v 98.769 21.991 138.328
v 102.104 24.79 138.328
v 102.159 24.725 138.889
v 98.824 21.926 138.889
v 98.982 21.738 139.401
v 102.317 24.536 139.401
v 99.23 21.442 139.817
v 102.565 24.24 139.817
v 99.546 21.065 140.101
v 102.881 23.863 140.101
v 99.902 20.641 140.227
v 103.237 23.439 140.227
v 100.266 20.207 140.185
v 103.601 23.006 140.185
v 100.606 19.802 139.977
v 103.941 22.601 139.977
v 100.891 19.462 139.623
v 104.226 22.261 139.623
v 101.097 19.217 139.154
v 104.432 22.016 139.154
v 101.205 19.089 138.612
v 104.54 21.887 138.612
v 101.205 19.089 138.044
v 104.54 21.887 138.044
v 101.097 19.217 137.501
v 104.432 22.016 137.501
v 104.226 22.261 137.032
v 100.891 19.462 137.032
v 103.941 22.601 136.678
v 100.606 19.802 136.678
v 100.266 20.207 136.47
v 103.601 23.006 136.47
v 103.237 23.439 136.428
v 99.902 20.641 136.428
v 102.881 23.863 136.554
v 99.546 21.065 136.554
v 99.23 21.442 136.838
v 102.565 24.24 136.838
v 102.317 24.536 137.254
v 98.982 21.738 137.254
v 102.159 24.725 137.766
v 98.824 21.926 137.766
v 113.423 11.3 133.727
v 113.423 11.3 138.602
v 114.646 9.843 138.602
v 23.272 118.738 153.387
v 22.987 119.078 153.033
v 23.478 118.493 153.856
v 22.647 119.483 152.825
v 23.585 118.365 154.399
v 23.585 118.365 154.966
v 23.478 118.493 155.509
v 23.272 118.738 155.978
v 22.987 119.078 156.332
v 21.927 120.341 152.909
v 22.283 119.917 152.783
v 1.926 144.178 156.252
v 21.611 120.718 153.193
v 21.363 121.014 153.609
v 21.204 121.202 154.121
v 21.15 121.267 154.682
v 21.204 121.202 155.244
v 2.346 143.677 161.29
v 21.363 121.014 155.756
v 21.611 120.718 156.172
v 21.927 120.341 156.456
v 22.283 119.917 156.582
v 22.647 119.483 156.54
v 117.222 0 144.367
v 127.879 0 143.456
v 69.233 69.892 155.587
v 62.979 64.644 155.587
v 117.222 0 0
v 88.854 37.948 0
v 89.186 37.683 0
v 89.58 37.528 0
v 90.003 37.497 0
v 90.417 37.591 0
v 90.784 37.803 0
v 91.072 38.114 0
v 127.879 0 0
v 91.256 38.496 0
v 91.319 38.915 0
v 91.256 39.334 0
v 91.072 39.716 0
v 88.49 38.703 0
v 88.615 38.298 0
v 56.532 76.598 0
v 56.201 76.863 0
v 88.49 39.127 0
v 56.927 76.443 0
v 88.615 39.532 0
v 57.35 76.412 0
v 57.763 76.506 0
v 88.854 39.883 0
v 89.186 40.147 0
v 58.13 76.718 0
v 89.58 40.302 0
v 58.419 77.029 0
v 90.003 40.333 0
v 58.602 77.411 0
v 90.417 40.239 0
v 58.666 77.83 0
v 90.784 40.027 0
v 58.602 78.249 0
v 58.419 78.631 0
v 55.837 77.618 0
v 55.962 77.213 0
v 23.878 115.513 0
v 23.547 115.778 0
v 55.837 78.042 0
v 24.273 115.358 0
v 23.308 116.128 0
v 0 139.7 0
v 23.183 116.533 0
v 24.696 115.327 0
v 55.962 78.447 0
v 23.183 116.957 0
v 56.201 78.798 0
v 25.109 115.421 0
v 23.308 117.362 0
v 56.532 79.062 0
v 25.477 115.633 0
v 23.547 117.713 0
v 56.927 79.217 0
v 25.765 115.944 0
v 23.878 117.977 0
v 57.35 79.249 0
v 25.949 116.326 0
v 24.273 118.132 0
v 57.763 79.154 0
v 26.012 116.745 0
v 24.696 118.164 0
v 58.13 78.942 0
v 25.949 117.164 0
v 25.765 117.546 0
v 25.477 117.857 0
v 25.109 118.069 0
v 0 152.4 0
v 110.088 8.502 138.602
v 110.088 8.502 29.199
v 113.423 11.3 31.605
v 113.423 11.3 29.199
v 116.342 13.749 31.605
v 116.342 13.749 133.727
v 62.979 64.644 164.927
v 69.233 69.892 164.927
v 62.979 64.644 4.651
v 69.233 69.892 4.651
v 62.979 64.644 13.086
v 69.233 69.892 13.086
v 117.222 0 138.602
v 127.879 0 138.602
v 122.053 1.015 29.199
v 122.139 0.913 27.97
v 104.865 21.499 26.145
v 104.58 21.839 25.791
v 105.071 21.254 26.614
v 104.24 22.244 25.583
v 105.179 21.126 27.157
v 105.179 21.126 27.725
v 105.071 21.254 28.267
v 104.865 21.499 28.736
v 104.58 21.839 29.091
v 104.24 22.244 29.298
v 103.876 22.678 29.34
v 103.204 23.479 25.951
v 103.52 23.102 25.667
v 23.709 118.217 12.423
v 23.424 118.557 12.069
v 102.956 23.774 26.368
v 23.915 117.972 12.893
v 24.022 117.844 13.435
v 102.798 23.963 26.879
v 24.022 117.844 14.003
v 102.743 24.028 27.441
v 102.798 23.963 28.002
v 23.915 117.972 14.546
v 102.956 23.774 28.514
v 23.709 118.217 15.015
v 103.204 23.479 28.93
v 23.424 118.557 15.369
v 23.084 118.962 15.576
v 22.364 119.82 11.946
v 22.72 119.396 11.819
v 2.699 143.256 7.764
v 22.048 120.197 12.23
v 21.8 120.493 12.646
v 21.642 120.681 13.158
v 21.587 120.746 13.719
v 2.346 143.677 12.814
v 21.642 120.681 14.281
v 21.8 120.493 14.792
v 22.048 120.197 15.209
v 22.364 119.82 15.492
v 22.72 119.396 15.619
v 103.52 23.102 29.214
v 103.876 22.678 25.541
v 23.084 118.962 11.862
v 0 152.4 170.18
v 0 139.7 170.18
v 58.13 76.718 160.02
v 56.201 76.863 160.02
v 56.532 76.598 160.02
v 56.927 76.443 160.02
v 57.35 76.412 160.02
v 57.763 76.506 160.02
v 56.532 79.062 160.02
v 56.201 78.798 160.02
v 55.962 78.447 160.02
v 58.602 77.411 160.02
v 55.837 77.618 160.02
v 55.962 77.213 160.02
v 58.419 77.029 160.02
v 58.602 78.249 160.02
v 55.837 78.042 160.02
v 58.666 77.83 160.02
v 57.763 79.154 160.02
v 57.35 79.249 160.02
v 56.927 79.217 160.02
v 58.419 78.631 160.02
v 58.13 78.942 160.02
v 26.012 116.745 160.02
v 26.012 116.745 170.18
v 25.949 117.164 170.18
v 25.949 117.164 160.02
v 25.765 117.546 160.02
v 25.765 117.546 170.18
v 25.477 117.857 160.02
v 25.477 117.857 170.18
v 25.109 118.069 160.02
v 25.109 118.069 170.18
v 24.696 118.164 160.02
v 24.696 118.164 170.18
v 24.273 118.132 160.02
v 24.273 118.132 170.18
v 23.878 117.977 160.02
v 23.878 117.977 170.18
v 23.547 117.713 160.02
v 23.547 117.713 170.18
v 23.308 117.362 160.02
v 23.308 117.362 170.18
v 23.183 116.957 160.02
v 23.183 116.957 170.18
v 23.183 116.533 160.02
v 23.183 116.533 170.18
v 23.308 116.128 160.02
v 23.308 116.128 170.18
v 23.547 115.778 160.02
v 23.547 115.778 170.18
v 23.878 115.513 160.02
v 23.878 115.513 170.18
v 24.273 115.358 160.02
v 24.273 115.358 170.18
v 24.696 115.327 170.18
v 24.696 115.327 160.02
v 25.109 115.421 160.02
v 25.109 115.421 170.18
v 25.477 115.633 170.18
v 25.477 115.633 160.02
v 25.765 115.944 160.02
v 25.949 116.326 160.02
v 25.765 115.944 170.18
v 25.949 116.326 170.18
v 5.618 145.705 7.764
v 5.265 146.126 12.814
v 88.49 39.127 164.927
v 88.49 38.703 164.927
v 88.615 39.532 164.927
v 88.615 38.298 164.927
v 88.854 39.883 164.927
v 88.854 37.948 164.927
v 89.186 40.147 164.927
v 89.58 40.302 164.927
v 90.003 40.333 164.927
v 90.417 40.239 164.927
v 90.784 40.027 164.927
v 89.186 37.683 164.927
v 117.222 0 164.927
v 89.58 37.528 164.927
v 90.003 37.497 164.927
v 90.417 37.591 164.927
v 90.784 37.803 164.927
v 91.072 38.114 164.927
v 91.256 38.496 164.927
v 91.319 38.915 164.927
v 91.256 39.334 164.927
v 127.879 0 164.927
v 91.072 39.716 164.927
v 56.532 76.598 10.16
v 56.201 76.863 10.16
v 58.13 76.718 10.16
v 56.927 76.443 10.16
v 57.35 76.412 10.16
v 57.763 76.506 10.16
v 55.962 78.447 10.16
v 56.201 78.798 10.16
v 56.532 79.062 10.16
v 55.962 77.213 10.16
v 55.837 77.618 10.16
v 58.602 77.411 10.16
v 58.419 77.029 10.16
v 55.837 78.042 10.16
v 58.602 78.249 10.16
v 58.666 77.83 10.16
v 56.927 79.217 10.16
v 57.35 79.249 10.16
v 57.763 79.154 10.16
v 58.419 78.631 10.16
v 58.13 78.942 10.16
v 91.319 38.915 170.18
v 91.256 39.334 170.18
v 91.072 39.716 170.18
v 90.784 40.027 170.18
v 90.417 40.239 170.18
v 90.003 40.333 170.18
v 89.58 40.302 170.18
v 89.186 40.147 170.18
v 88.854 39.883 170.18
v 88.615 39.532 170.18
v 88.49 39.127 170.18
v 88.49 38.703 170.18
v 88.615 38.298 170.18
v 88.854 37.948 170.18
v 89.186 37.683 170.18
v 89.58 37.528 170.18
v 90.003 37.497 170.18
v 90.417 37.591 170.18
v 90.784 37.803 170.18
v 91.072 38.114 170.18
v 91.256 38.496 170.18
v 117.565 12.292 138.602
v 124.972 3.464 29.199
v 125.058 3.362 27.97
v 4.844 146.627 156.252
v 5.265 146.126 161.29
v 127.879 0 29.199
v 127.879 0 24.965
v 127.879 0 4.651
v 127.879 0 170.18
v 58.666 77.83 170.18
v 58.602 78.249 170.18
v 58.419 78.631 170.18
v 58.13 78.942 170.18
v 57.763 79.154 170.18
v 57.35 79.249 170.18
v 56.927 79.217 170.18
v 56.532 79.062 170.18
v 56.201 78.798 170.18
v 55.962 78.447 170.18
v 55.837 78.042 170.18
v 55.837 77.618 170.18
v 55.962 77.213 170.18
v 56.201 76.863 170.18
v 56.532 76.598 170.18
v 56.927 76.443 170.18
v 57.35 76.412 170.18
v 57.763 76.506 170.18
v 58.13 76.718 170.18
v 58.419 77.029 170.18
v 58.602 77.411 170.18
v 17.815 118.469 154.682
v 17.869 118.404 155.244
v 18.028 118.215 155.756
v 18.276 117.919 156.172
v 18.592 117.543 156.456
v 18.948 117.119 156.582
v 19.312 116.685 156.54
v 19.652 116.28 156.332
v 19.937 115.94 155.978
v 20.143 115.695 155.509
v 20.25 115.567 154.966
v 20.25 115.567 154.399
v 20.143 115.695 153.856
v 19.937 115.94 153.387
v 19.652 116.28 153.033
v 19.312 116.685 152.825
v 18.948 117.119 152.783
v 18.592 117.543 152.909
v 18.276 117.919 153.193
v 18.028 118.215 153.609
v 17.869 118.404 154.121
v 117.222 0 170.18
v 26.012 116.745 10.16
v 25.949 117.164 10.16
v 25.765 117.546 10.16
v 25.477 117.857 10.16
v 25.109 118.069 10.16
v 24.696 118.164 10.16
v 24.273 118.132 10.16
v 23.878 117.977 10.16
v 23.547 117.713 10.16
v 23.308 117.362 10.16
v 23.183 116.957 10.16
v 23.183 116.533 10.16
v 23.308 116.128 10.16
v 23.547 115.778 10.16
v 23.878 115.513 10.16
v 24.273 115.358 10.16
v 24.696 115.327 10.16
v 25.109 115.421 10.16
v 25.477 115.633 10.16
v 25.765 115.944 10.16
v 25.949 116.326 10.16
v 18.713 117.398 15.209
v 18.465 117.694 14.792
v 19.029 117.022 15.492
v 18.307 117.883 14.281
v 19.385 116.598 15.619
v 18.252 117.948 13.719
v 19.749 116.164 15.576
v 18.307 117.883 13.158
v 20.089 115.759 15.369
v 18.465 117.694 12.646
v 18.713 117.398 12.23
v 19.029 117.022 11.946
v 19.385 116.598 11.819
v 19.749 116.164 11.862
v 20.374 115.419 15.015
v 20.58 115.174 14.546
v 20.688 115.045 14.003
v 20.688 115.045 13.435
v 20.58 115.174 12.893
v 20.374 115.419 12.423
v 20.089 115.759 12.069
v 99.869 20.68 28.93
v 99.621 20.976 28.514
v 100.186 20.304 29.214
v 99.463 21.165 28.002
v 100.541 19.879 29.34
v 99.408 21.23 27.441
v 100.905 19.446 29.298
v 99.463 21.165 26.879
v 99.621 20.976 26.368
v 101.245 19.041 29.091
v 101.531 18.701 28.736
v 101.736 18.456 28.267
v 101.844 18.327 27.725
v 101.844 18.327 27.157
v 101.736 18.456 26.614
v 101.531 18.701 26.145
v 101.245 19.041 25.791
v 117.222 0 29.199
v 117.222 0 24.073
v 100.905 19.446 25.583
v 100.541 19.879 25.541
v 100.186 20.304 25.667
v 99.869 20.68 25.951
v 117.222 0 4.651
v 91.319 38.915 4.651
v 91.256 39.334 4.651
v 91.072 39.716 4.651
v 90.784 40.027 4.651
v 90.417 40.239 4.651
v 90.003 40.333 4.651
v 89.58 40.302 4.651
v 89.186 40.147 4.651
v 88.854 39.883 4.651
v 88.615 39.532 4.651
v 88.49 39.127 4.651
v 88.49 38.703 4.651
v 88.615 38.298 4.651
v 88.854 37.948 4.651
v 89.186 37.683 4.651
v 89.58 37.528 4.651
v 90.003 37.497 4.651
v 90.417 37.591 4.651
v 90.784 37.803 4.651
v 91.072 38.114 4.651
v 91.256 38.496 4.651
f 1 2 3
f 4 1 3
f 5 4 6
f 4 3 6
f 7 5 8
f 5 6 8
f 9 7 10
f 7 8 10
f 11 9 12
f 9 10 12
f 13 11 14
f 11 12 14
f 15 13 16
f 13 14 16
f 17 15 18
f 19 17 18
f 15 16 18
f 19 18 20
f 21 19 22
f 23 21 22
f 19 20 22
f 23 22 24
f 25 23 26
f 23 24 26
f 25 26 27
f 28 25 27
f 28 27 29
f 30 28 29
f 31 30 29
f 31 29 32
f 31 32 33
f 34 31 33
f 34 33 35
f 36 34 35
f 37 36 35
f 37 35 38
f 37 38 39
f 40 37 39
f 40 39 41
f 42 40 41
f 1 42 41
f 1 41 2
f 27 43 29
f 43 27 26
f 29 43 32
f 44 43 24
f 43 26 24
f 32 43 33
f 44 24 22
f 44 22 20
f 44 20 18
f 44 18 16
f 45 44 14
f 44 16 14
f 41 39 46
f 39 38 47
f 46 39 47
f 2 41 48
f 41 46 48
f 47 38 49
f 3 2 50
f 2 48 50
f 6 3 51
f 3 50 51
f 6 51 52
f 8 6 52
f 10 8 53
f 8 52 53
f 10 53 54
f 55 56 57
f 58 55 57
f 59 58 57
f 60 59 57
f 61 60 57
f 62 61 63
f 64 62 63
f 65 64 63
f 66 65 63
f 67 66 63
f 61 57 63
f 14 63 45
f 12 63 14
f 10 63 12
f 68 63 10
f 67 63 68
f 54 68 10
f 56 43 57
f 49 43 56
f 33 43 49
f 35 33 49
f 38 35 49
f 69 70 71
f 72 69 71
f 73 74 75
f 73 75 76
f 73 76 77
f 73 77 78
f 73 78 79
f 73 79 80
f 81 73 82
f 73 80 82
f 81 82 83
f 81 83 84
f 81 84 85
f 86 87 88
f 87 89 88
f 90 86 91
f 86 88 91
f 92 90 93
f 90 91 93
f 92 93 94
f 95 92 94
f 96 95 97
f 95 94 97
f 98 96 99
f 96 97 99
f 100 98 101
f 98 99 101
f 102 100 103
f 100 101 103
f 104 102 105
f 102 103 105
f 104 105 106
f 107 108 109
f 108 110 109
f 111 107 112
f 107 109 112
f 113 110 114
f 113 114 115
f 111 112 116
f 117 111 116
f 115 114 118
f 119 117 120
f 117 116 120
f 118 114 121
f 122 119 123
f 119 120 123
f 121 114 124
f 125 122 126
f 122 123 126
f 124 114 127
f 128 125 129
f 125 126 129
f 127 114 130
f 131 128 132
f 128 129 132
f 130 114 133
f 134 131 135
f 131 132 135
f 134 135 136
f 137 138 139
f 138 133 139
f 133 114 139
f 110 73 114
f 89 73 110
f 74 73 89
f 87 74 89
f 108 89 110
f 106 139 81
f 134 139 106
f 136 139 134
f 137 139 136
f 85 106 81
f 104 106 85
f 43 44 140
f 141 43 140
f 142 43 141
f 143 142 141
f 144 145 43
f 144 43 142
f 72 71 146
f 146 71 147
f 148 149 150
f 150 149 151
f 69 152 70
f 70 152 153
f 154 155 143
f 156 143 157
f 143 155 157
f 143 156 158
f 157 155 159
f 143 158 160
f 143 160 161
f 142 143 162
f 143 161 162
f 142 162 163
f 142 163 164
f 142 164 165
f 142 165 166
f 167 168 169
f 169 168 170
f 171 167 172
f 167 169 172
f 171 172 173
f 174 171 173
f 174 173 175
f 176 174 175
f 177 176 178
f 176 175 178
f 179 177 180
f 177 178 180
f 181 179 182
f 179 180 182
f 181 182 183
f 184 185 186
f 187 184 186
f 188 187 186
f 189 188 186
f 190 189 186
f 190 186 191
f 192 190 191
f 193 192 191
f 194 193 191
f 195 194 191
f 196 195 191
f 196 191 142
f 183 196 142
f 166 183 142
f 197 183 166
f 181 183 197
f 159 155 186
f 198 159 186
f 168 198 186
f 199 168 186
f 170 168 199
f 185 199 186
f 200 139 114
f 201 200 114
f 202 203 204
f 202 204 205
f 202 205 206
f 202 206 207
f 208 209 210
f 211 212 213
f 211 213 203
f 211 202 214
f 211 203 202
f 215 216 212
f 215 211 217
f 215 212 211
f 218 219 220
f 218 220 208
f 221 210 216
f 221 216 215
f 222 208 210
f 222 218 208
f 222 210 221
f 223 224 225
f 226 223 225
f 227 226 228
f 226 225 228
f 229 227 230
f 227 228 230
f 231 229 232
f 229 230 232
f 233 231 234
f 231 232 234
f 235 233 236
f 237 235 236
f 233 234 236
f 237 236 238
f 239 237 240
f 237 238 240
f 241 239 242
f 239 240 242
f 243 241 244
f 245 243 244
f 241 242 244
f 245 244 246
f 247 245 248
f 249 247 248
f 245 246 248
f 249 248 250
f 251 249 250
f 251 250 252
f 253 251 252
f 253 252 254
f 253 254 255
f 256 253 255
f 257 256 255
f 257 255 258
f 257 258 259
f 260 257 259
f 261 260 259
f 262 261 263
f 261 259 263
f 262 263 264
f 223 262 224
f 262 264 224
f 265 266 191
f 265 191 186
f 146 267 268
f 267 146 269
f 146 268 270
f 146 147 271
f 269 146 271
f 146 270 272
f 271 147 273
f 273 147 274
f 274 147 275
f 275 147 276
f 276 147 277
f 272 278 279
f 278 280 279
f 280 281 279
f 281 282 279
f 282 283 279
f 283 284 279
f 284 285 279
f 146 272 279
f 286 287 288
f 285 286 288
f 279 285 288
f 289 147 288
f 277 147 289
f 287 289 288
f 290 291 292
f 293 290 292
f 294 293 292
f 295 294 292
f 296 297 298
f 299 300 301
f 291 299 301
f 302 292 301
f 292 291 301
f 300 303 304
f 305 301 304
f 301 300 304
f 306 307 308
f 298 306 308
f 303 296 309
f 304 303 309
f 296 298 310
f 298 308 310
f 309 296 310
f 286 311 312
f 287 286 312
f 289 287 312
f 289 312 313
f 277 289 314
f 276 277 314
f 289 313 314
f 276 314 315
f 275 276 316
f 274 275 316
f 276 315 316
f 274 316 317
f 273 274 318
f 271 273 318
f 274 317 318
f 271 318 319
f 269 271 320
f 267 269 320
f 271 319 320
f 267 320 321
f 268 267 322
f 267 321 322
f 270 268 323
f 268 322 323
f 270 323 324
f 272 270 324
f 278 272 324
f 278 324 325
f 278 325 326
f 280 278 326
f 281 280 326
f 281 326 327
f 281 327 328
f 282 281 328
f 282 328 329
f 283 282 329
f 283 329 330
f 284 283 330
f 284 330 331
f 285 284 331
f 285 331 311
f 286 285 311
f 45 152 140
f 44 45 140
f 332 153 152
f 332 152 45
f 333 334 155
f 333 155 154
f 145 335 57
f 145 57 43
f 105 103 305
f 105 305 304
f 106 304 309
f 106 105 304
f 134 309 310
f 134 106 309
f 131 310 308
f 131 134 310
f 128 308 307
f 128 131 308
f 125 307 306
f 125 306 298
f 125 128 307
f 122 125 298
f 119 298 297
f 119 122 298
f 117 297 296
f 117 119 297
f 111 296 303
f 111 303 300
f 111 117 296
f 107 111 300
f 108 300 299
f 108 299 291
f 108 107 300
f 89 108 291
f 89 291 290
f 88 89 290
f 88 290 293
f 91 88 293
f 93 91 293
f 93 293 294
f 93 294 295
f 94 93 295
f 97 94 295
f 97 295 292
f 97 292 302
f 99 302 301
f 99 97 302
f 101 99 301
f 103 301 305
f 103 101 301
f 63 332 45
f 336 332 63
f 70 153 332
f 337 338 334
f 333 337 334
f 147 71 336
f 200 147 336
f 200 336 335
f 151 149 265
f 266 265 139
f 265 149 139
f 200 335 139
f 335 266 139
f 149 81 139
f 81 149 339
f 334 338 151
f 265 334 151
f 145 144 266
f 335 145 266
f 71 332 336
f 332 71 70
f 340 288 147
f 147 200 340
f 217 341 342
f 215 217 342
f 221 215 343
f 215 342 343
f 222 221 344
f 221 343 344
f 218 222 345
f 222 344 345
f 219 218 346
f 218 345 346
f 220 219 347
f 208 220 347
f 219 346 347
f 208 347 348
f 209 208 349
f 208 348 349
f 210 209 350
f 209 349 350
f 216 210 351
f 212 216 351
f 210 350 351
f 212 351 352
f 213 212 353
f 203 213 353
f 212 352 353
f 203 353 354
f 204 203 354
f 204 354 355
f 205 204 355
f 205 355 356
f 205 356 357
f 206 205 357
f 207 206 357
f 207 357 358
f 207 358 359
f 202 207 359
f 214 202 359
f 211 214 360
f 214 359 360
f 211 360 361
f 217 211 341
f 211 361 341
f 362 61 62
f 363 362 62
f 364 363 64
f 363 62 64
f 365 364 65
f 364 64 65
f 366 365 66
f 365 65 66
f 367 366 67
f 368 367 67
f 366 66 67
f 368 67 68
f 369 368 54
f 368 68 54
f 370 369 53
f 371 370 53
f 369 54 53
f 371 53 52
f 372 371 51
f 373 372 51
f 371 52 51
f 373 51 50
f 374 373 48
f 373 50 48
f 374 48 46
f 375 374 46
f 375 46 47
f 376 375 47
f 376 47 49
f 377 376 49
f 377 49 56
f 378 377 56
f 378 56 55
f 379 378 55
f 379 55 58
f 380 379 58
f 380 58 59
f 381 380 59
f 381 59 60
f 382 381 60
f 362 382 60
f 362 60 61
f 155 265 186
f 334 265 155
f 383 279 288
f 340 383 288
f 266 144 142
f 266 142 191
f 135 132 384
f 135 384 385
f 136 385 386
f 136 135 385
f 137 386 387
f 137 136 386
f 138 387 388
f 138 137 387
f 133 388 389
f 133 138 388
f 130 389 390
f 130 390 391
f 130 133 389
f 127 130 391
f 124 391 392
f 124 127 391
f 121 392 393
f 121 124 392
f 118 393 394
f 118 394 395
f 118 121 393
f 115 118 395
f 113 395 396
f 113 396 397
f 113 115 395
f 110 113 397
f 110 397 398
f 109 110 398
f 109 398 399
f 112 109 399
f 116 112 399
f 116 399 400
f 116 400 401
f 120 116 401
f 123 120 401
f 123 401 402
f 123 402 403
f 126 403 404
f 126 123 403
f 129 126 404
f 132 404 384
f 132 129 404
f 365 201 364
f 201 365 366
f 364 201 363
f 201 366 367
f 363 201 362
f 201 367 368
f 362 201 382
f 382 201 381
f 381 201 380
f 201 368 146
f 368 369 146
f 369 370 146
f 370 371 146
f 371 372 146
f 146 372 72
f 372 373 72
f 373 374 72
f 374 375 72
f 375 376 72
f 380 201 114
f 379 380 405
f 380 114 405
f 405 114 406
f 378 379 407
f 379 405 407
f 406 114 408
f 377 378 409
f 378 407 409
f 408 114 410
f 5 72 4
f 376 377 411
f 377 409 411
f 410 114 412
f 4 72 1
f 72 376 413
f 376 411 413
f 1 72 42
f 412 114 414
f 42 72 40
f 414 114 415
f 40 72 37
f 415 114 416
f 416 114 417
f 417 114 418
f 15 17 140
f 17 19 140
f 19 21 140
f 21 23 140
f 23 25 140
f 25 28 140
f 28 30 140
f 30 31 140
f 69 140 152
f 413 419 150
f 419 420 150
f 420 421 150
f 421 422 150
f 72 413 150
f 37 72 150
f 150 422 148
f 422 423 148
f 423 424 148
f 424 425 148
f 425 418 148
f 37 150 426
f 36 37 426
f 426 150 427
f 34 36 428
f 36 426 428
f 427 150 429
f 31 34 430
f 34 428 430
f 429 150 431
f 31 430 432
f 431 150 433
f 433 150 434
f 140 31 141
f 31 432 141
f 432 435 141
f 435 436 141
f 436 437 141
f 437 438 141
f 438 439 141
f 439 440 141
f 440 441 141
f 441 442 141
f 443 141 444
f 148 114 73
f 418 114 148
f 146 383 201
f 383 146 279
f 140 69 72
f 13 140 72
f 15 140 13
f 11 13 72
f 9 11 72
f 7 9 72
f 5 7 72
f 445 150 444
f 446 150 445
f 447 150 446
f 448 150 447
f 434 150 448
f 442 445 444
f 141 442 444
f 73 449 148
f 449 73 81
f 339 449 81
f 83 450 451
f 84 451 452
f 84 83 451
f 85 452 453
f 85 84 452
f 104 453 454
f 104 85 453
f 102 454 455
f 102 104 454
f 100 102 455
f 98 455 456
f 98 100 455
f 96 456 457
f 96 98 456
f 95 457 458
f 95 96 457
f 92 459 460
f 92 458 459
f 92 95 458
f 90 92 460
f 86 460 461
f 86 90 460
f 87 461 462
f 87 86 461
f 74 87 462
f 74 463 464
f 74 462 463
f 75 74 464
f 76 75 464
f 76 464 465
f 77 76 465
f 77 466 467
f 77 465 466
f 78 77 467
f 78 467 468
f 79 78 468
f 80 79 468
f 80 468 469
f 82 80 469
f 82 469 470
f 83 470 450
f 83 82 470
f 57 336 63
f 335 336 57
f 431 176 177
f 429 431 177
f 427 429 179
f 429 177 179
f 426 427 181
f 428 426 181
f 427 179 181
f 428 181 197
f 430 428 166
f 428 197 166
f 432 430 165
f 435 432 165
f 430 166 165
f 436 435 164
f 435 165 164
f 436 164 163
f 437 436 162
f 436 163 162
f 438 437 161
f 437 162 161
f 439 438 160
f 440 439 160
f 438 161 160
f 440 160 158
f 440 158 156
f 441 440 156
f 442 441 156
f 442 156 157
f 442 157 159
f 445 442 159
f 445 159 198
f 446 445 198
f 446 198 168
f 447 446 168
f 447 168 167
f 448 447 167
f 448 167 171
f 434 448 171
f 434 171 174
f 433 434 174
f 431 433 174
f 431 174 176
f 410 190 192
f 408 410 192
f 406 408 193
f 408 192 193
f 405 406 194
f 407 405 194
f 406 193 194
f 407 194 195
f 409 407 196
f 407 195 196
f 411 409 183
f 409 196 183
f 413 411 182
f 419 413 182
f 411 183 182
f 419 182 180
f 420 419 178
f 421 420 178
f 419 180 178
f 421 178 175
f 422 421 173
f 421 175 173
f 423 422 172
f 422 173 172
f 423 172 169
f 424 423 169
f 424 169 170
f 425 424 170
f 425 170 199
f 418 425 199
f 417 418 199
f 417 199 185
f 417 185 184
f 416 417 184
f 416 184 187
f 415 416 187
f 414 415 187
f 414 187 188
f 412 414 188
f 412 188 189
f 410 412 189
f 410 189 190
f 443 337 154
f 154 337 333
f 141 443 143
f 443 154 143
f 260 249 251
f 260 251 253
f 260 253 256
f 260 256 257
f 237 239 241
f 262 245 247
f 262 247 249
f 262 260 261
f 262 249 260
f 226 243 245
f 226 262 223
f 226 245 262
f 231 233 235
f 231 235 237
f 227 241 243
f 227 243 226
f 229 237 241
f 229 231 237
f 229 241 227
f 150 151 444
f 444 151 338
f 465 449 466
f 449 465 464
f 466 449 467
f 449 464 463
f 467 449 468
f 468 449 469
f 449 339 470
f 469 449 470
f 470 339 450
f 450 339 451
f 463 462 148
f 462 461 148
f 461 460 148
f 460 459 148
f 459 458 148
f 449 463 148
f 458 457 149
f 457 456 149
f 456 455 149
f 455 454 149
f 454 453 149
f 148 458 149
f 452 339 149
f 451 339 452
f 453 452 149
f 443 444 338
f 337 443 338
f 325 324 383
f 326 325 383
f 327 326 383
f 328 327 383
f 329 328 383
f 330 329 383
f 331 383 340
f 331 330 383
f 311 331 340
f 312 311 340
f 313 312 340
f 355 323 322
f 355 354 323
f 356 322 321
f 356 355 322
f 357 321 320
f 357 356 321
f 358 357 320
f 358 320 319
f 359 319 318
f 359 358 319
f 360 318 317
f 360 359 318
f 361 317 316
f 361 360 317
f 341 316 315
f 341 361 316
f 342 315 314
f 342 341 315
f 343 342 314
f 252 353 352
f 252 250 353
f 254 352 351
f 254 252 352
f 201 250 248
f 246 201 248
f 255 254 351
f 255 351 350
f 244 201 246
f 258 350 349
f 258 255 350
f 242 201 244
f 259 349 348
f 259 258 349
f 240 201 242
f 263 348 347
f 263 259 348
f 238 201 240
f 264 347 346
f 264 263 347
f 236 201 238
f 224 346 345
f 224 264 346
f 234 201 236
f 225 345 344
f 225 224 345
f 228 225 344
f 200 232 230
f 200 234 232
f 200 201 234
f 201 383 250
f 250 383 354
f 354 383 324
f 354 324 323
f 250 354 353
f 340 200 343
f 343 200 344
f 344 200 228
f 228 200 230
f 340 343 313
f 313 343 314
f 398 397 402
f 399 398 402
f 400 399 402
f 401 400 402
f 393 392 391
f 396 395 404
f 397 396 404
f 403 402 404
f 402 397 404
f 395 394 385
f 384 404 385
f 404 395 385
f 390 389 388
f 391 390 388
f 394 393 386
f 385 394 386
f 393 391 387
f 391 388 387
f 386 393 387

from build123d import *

# Parameters (mm, degrees)
BOSS_EXTRUDE1_DEPTH     = 170.18
CUT_EXTRUDE_THIN2_DEPTH = 3.81
CUT_EXTRUDE1_DEPTH      = 25.4
SKETCH4_R               = 1.4224
CUT_EXTRUDE2_DEPTH      = 10.16
SKETCH5_W               = 109.403315499
SKETCH5_H               = 17.948067256
CUT_EXTRUDE3_DEPTH      = 12.7
SKETCH6_R               = 1.905
CUT_EXTRUDE4_DEPTH      = 12.7


with BuildPart() as part:
    # Sketch1 → Boss-Extrude1 (new body)
    with BuildSketch(Plane.XY):
        Polygon((0, 139.7), (117.222218475, 0), (127.878783791, 0), (0, 152.4), align=None)
    extrude(amount=BOSS_EXTRUDE1_DEPTH)

    # Sketch2 → Cut-Extrude-Thin2 (cut)
    with BuildSketch(Plane(origin=(75.04235078, 62.968008862, 0), x_dir=(0, 0, -1), z_dir=(0.7660444431189745, 0.6427876096865436, 0))):
        Polygon((-137.16, -77.261258255), (-161.29, 108.554672373), (-156.252299153, 109.208866666), (-132.122299153, -76.607063962), align=None)
        Polygon((-33.02, -77.261258255), (-12.813831453, 108.554672373), (-7.763603235, 108.005495764), (-27.969771782, -77.810434864), align=None)
    extrude(amount=-CUT_EXTRUDE_THIN2_DEPTH, mode=Mode.SUBTRACT)

    # Sketch3 → Cut-Extrude1 (cut)
    with BuildSketch(Plane(origin=(75.04235078, 62.968008862, 0), x_dir=(0, 0, -1), z_dir=(0.7660444431189745, 0.6427876096865436, 0))):
        Polygon((-164.926611636, 9.038106978), (-164.926611636, -99.720446986), (-141.126263261, -99.720446986), (-155.587234425, 9.038106978), align=None)
        Polygon((-13.086414412, 9.038106978), (-27.246115343, -99.720446986), (-4.650847899, -99.720446986), (-4.650847899, 9.038106978), align=None)
    extrude(amount=-CUT_EXTRUDE1_DEPTH, mode=Mode.SUBTRACT)

    # Sketch4 → Cut-Extrude2 (cut)
    with BuildSketch(Plane.XY.offset(170.18)):
        with Locations((24.589669417, 116.745173131)):
            Circle(SKETCH4_R)
        with Locations((57.243279989, 77.830115421)):
            Circle(SKETCH4_R)
        with Locations((89.896890561, 38.91505771)):
            Circle(SKETCH4_R)
    cut_extrude2 = extrude(amount=-CUT_EXTRUDE2_DEPTH, mode=Mode.SUBTRACT)

    # Mirror1: Cut-Extrude2 across plane
    add(cut_extrude2.mirror(Plane.XY.offset(85.09)), mode=Mode.SUBTRACT)

    # Sketch5 → Cut-Extrude3 (cut)
    with BuildSketch(Plane(origin=(75.04235078, 62.968008862, 0), x_dir=(0, 0, -1), z_dir=(0.7660444431189746, 0.6427876096865437, 0))):
        with Locations((-83.900833528, -73.224864135)):
            Rectangle(SKETCH5_W, SKETCH5_H)
    extrude(amount=-CUT_EXTRUDE3_DEPTH, mode=Mode.SUBTRACT)

    # Sketch6 → Cut-Extrude4 (cut)
    with BuildSketch(Plane(origin=(72.123721451, 60.518988069, 0), x_dir=(0, 0, -1), z_dir=(0.7660444431189746, 0.6427876096865437, 0))):
        with Locations(Location((-154.682435242, 77.396139224, 0), (0, 0, 90))):
            Circle(SKETCH6_R)
        with Locations(Location((-138.327577907, -48.546381958, 0), (0, 0, 90))):
            Circle(SKETCH6_R)
        with Locations(Location((-13.719119266, 76.715945514, 0), (0, 0, 90))):
            Circle(SKETCH6_R)
        with Locations(Location((-27.440726954, -49.540608702, 0), (0, 0, 90))):
            Circle(SKETCH6_R)
    extrude(amount=-CUT_EXTRUDE4_DEPTH, mode=Mode.SUBTRACT)


solid = part.part
